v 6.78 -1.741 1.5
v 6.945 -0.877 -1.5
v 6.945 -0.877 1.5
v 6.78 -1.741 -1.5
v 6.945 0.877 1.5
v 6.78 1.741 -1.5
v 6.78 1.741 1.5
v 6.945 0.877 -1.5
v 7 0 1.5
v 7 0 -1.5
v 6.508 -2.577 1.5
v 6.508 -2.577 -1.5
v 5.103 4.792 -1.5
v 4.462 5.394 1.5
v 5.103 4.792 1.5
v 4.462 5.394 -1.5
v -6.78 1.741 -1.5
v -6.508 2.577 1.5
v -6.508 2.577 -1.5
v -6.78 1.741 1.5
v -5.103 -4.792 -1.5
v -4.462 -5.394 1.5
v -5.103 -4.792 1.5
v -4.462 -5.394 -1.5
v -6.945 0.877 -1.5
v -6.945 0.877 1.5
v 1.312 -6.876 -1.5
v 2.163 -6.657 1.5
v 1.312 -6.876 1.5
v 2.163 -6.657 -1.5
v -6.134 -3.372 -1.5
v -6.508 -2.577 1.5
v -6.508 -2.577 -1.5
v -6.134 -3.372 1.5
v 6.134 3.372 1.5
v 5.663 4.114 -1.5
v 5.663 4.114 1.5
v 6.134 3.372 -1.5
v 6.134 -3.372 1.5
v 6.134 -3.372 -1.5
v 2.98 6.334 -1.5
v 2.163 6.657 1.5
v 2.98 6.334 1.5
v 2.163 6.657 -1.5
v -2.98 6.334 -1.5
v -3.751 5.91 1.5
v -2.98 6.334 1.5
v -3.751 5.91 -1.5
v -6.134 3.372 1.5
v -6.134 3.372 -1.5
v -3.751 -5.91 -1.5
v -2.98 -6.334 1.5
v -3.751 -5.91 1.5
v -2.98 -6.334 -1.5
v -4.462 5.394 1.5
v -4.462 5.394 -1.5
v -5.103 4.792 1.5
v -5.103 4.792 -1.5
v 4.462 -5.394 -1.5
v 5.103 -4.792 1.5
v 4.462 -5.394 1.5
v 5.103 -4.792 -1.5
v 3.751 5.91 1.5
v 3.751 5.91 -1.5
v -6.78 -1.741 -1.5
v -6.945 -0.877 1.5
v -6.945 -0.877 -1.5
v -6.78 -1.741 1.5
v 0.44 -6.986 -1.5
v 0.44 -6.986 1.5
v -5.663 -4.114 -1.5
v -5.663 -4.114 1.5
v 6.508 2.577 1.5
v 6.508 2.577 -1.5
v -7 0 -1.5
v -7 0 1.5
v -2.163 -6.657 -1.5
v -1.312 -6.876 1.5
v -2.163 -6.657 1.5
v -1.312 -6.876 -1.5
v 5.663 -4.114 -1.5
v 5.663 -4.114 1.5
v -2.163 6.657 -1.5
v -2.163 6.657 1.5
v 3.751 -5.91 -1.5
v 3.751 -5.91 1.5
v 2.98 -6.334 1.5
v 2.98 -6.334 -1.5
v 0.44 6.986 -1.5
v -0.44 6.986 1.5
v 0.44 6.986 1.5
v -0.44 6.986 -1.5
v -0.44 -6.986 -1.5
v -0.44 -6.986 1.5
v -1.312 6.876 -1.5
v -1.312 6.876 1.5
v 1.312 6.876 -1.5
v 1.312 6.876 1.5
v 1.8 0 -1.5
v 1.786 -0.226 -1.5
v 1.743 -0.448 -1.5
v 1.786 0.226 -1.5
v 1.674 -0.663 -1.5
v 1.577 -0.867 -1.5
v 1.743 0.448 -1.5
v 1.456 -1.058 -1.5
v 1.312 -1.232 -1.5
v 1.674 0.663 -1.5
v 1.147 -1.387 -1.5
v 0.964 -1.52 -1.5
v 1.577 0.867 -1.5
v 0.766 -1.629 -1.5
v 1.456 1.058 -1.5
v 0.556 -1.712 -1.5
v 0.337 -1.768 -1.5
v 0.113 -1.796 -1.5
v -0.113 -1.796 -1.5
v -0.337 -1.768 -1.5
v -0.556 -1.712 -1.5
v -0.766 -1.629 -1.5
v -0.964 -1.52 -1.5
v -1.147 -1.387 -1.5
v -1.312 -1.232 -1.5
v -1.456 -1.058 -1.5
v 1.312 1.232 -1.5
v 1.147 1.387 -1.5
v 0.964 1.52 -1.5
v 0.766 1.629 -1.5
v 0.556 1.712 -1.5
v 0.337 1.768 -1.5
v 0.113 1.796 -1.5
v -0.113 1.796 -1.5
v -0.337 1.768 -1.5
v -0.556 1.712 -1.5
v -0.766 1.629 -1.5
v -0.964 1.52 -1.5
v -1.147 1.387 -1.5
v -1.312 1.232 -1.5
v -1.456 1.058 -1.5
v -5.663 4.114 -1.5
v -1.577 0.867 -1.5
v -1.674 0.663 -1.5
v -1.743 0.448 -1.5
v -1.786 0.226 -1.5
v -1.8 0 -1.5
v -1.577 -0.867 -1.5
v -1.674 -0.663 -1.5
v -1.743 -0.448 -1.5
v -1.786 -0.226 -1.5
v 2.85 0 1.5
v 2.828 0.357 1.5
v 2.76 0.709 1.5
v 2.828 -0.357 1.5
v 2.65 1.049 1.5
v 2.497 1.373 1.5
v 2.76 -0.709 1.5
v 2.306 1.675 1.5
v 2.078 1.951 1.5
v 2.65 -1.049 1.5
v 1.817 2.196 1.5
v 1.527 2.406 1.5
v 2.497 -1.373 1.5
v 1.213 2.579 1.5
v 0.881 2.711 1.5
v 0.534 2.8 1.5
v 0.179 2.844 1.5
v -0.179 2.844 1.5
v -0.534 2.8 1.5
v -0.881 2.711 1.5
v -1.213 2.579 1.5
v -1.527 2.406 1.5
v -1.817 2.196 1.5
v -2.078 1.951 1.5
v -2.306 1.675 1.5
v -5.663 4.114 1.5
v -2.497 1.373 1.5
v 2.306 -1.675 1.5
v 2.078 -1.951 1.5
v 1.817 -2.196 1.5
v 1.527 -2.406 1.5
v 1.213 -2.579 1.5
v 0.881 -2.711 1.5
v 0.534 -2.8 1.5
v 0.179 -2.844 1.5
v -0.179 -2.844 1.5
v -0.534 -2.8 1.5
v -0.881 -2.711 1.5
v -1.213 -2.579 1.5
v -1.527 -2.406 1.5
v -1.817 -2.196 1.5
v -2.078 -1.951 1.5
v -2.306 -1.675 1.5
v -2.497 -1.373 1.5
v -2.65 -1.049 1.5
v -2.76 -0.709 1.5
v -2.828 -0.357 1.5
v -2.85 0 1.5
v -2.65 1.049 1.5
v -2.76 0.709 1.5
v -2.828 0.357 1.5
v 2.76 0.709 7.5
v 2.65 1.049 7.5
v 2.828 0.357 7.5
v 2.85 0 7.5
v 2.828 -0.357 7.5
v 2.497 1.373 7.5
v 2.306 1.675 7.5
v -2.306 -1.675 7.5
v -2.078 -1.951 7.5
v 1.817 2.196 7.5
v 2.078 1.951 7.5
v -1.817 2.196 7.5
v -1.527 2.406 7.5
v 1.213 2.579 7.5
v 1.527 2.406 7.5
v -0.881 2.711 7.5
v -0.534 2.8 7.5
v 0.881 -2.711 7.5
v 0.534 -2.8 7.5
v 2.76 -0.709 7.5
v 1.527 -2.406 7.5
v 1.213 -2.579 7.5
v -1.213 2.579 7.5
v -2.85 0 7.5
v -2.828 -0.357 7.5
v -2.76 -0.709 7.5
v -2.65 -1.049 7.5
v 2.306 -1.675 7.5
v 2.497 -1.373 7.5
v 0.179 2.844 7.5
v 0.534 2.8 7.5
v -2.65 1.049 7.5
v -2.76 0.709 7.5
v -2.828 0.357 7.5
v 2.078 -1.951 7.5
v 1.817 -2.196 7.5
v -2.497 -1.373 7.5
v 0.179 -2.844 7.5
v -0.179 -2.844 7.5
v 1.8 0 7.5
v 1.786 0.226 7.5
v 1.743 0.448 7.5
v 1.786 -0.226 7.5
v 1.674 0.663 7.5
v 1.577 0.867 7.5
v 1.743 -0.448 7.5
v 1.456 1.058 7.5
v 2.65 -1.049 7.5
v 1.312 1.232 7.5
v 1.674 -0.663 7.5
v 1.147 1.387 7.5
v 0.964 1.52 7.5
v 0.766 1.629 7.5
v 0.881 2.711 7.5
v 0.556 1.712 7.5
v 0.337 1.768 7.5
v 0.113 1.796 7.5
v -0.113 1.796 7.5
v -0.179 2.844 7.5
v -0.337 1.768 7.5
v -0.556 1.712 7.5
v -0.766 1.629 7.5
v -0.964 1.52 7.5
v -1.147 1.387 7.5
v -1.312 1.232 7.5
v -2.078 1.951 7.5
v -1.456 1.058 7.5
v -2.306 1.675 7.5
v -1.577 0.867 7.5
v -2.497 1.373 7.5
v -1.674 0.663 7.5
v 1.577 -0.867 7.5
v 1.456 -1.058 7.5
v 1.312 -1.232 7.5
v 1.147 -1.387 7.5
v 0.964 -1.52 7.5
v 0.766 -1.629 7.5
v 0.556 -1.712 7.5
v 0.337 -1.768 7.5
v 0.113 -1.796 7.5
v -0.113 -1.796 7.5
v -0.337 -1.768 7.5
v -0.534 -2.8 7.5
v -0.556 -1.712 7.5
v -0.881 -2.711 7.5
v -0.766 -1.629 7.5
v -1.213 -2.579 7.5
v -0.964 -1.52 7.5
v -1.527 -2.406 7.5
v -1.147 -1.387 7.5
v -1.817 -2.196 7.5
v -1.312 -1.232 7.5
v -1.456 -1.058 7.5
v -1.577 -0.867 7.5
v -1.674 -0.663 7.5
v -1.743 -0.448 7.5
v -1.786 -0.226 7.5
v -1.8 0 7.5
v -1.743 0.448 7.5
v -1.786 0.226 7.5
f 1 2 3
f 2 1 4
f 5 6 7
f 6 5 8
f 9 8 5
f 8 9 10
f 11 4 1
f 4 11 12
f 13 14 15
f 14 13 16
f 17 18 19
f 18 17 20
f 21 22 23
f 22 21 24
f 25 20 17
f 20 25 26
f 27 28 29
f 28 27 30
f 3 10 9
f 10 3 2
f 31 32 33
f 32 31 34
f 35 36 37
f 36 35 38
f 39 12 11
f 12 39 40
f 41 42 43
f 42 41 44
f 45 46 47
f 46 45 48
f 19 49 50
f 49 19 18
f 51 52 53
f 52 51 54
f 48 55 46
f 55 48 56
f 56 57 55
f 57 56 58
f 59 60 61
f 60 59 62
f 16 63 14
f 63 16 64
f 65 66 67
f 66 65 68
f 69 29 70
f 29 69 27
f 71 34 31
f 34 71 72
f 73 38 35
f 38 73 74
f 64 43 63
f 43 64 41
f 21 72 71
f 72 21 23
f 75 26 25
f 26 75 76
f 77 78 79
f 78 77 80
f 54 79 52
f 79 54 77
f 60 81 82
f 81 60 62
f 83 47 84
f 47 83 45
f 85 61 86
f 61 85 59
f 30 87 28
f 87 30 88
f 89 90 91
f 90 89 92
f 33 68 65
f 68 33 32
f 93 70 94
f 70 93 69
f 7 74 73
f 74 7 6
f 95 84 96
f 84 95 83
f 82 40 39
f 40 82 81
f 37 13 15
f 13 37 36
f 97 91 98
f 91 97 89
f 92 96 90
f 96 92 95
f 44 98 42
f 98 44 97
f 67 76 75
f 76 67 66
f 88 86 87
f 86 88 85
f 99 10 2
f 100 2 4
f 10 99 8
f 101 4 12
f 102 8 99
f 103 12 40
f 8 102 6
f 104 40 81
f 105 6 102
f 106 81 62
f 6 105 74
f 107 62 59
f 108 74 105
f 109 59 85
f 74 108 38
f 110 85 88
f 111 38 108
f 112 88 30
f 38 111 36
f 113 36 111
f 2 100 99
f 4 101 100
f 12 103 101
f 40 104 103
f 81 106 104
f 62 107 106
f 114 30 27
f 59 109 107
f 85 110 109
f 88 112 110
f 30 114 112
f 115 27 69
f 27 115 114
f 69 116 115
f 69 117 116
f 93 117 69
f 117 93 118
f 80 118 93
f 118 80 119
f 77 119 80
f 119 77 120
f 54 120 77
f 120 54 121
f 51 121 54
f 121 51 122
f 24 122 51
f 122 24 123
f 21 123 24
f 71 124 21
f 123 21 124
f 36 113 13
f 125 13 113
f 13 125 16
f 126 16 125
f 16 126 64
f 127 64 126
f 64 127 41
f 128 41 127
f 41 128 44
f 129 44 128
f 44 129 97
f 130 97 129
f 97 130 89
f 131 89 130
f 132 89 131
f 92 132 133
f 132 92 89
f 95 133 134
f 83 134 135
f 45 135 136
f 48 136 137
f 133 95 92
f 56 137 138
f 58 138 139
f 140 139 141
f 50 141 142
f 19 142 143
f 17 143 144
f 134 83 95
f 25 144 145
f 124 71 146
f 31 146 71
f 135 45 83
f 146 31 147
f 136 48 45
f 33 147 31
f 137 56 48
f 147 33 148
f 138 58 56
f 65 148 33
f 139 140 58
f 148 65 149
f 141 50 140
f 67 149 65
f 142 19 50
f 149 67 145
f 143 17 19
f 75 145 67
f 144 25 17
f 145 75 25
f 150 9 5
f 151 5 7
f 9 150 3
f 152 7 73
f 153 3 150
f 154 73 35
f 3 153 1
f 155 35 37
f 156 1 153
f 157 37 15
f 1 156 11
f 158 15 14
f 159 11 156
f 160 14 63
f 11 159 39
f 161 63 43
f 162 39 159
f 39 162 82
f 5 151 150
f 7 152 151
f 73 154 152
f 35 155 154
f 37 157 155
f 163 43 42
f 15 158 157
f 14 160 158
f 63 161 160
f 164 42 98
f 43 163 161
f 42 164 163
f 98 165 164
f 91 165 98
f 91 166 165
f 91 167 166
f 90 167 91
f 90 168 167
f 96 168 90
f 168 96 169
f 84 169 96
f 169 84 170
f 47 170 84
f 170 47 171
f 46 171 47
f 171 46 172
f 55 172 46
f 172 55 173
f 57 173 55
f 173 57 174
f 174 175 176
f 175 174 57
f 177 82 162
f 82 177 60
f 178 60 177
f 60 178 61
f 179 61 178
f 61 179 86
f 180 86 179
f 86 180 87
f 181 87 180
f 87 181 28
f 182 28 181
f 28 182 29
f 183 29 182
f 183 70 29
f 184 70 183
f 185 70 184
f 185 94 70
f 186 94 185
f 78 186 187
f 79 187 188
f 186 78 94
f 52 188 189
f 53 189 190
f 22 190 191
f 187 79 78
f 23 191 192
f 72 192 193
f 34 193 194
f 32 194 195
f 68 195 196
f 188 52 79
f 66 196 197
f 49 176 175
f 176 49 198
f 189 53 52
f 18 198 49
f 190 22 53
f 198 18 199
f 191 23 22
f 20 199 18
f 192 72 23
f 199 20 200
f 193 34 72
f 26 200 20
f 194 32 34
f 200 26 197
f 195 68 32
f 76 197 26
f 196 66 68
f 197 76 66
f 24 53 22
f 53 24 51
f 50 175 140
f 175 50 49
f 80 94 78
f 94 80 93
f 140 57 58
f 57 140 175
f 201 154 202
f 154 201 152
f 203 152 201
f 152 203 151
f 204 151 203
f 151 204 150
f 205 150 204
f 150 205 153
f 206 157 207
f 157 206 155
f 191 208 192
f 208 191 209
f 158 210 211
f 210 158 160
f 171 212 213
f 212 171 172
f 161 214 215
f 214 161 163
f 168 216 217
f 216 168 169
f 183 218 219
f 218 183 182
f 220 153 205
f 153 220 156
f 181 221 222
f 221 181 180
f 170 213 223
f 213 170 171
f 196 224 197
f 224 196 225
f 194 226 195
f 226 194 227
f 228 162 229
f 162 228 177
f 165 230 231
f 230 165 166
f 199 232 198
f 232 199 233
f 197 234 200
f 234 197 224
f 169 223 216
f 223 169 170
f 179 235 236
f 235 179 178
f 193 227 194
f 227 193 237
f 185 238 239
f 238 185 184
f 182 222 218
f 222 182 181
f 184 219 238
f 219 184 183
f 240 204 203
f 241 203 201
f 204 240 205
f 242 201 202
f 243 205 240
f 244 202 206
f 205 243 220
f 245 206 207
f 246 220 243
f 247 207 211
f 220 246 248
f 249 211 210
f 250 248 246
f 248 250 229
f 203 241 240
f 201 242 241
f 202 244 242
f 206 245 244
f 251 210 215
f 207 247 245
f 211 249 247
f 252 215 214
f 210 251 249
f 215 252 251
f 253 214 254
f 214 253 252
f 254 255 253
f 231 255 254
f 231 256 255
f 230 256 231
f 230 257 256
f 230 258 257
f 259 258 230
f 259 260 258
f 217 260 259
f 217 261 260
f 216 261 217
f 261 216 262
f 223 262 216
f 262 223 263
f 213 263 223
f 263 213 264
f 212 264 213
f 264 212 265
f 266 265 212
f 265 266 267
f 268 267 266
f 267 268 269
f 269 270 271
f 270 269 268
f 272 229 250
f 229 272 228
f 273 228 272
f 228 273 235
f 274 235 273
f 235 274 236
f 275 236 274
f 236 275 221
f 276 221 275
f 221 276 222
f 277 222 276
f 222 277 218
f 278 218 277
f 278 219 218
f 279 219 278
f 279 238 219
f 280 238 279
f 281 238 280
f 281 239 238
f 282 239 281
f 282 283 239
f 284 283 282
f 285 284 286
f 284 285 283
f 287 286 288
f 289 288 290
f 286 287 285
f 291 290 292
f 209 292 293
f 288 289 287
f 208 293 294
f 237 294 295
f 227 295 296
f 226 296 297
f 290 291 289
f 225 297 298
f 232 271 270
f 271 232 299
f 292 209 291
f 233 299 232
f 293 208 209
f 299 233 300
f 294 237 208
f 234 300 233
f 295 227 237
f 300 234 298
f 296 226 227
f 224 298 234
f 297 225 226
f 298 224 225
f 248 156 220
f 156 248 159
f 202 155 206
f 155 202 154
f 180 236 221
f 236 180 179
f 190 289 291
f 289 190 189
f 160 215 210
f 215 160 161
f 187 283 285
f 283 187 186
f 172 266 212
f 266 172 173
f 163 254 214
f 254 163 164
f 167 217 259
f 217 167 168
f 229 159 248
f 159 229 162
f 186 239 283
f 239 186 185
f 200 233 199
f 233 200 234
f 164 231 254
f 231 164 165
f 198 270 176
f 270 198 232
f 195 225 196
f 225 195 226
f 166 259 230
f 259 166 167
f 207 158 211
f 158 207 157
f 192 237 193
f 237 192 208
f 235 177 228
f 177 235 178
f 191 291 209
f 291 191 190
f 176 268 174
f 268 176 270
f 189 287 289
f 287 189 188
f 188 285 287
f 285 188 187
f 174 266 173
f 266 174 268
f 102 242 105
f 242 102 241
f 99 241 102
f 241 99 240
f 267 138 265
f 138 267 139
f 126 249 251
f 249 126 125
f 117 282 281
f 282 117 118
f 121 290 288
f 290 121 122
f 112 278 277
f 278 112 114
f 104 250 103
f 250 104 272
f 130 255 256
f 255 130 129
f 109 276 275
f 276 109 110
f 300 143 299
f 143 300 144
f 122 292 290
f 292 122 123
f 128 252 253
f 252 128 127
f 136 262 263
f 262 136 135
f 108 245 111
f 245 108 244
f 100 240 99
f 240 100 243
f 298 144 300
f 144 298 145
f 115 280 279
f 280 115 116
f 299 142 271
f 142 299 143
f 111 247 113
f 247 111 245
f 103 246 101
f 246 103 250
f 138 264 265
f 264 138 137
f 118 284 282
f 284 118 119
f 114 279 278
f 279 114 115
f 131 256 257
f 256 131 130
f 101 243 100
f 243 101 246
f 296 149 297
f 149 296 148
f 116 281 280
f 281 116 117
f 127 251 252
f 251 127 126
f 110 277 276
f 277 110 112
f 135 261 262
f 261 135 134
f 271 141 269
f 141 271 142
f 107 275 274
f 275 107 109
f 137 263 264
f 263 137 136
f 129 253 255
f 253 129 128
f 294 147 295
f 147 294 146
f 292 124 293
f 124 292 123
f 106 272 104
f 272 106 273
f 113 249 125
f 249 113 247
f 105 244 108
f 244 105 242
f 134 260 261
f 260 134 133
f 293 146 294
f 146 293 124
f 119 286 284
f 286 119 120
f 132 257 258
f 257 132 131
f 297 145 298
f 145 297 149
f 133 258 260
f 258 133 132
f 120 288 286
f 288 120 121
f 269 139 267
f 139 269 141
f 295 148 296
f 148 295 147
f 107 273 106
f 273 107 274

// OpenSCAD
$fn = 50;


difference() {
	union() {
		translate(v = [0, 0, -1.5000000000]) {
			cylinder(h = 3, r = 7.0000000000);
		}
		translate(v = [0, 0, -1.5000000000]) {
			cylinder(h = 9, r = 2.8500000000);
		}
	}
	union() {
		translate(v = [0, 0, -100.0000000000]) {
			cylinder(h = 200, r = 1.8000000000);
		}
	}
}
